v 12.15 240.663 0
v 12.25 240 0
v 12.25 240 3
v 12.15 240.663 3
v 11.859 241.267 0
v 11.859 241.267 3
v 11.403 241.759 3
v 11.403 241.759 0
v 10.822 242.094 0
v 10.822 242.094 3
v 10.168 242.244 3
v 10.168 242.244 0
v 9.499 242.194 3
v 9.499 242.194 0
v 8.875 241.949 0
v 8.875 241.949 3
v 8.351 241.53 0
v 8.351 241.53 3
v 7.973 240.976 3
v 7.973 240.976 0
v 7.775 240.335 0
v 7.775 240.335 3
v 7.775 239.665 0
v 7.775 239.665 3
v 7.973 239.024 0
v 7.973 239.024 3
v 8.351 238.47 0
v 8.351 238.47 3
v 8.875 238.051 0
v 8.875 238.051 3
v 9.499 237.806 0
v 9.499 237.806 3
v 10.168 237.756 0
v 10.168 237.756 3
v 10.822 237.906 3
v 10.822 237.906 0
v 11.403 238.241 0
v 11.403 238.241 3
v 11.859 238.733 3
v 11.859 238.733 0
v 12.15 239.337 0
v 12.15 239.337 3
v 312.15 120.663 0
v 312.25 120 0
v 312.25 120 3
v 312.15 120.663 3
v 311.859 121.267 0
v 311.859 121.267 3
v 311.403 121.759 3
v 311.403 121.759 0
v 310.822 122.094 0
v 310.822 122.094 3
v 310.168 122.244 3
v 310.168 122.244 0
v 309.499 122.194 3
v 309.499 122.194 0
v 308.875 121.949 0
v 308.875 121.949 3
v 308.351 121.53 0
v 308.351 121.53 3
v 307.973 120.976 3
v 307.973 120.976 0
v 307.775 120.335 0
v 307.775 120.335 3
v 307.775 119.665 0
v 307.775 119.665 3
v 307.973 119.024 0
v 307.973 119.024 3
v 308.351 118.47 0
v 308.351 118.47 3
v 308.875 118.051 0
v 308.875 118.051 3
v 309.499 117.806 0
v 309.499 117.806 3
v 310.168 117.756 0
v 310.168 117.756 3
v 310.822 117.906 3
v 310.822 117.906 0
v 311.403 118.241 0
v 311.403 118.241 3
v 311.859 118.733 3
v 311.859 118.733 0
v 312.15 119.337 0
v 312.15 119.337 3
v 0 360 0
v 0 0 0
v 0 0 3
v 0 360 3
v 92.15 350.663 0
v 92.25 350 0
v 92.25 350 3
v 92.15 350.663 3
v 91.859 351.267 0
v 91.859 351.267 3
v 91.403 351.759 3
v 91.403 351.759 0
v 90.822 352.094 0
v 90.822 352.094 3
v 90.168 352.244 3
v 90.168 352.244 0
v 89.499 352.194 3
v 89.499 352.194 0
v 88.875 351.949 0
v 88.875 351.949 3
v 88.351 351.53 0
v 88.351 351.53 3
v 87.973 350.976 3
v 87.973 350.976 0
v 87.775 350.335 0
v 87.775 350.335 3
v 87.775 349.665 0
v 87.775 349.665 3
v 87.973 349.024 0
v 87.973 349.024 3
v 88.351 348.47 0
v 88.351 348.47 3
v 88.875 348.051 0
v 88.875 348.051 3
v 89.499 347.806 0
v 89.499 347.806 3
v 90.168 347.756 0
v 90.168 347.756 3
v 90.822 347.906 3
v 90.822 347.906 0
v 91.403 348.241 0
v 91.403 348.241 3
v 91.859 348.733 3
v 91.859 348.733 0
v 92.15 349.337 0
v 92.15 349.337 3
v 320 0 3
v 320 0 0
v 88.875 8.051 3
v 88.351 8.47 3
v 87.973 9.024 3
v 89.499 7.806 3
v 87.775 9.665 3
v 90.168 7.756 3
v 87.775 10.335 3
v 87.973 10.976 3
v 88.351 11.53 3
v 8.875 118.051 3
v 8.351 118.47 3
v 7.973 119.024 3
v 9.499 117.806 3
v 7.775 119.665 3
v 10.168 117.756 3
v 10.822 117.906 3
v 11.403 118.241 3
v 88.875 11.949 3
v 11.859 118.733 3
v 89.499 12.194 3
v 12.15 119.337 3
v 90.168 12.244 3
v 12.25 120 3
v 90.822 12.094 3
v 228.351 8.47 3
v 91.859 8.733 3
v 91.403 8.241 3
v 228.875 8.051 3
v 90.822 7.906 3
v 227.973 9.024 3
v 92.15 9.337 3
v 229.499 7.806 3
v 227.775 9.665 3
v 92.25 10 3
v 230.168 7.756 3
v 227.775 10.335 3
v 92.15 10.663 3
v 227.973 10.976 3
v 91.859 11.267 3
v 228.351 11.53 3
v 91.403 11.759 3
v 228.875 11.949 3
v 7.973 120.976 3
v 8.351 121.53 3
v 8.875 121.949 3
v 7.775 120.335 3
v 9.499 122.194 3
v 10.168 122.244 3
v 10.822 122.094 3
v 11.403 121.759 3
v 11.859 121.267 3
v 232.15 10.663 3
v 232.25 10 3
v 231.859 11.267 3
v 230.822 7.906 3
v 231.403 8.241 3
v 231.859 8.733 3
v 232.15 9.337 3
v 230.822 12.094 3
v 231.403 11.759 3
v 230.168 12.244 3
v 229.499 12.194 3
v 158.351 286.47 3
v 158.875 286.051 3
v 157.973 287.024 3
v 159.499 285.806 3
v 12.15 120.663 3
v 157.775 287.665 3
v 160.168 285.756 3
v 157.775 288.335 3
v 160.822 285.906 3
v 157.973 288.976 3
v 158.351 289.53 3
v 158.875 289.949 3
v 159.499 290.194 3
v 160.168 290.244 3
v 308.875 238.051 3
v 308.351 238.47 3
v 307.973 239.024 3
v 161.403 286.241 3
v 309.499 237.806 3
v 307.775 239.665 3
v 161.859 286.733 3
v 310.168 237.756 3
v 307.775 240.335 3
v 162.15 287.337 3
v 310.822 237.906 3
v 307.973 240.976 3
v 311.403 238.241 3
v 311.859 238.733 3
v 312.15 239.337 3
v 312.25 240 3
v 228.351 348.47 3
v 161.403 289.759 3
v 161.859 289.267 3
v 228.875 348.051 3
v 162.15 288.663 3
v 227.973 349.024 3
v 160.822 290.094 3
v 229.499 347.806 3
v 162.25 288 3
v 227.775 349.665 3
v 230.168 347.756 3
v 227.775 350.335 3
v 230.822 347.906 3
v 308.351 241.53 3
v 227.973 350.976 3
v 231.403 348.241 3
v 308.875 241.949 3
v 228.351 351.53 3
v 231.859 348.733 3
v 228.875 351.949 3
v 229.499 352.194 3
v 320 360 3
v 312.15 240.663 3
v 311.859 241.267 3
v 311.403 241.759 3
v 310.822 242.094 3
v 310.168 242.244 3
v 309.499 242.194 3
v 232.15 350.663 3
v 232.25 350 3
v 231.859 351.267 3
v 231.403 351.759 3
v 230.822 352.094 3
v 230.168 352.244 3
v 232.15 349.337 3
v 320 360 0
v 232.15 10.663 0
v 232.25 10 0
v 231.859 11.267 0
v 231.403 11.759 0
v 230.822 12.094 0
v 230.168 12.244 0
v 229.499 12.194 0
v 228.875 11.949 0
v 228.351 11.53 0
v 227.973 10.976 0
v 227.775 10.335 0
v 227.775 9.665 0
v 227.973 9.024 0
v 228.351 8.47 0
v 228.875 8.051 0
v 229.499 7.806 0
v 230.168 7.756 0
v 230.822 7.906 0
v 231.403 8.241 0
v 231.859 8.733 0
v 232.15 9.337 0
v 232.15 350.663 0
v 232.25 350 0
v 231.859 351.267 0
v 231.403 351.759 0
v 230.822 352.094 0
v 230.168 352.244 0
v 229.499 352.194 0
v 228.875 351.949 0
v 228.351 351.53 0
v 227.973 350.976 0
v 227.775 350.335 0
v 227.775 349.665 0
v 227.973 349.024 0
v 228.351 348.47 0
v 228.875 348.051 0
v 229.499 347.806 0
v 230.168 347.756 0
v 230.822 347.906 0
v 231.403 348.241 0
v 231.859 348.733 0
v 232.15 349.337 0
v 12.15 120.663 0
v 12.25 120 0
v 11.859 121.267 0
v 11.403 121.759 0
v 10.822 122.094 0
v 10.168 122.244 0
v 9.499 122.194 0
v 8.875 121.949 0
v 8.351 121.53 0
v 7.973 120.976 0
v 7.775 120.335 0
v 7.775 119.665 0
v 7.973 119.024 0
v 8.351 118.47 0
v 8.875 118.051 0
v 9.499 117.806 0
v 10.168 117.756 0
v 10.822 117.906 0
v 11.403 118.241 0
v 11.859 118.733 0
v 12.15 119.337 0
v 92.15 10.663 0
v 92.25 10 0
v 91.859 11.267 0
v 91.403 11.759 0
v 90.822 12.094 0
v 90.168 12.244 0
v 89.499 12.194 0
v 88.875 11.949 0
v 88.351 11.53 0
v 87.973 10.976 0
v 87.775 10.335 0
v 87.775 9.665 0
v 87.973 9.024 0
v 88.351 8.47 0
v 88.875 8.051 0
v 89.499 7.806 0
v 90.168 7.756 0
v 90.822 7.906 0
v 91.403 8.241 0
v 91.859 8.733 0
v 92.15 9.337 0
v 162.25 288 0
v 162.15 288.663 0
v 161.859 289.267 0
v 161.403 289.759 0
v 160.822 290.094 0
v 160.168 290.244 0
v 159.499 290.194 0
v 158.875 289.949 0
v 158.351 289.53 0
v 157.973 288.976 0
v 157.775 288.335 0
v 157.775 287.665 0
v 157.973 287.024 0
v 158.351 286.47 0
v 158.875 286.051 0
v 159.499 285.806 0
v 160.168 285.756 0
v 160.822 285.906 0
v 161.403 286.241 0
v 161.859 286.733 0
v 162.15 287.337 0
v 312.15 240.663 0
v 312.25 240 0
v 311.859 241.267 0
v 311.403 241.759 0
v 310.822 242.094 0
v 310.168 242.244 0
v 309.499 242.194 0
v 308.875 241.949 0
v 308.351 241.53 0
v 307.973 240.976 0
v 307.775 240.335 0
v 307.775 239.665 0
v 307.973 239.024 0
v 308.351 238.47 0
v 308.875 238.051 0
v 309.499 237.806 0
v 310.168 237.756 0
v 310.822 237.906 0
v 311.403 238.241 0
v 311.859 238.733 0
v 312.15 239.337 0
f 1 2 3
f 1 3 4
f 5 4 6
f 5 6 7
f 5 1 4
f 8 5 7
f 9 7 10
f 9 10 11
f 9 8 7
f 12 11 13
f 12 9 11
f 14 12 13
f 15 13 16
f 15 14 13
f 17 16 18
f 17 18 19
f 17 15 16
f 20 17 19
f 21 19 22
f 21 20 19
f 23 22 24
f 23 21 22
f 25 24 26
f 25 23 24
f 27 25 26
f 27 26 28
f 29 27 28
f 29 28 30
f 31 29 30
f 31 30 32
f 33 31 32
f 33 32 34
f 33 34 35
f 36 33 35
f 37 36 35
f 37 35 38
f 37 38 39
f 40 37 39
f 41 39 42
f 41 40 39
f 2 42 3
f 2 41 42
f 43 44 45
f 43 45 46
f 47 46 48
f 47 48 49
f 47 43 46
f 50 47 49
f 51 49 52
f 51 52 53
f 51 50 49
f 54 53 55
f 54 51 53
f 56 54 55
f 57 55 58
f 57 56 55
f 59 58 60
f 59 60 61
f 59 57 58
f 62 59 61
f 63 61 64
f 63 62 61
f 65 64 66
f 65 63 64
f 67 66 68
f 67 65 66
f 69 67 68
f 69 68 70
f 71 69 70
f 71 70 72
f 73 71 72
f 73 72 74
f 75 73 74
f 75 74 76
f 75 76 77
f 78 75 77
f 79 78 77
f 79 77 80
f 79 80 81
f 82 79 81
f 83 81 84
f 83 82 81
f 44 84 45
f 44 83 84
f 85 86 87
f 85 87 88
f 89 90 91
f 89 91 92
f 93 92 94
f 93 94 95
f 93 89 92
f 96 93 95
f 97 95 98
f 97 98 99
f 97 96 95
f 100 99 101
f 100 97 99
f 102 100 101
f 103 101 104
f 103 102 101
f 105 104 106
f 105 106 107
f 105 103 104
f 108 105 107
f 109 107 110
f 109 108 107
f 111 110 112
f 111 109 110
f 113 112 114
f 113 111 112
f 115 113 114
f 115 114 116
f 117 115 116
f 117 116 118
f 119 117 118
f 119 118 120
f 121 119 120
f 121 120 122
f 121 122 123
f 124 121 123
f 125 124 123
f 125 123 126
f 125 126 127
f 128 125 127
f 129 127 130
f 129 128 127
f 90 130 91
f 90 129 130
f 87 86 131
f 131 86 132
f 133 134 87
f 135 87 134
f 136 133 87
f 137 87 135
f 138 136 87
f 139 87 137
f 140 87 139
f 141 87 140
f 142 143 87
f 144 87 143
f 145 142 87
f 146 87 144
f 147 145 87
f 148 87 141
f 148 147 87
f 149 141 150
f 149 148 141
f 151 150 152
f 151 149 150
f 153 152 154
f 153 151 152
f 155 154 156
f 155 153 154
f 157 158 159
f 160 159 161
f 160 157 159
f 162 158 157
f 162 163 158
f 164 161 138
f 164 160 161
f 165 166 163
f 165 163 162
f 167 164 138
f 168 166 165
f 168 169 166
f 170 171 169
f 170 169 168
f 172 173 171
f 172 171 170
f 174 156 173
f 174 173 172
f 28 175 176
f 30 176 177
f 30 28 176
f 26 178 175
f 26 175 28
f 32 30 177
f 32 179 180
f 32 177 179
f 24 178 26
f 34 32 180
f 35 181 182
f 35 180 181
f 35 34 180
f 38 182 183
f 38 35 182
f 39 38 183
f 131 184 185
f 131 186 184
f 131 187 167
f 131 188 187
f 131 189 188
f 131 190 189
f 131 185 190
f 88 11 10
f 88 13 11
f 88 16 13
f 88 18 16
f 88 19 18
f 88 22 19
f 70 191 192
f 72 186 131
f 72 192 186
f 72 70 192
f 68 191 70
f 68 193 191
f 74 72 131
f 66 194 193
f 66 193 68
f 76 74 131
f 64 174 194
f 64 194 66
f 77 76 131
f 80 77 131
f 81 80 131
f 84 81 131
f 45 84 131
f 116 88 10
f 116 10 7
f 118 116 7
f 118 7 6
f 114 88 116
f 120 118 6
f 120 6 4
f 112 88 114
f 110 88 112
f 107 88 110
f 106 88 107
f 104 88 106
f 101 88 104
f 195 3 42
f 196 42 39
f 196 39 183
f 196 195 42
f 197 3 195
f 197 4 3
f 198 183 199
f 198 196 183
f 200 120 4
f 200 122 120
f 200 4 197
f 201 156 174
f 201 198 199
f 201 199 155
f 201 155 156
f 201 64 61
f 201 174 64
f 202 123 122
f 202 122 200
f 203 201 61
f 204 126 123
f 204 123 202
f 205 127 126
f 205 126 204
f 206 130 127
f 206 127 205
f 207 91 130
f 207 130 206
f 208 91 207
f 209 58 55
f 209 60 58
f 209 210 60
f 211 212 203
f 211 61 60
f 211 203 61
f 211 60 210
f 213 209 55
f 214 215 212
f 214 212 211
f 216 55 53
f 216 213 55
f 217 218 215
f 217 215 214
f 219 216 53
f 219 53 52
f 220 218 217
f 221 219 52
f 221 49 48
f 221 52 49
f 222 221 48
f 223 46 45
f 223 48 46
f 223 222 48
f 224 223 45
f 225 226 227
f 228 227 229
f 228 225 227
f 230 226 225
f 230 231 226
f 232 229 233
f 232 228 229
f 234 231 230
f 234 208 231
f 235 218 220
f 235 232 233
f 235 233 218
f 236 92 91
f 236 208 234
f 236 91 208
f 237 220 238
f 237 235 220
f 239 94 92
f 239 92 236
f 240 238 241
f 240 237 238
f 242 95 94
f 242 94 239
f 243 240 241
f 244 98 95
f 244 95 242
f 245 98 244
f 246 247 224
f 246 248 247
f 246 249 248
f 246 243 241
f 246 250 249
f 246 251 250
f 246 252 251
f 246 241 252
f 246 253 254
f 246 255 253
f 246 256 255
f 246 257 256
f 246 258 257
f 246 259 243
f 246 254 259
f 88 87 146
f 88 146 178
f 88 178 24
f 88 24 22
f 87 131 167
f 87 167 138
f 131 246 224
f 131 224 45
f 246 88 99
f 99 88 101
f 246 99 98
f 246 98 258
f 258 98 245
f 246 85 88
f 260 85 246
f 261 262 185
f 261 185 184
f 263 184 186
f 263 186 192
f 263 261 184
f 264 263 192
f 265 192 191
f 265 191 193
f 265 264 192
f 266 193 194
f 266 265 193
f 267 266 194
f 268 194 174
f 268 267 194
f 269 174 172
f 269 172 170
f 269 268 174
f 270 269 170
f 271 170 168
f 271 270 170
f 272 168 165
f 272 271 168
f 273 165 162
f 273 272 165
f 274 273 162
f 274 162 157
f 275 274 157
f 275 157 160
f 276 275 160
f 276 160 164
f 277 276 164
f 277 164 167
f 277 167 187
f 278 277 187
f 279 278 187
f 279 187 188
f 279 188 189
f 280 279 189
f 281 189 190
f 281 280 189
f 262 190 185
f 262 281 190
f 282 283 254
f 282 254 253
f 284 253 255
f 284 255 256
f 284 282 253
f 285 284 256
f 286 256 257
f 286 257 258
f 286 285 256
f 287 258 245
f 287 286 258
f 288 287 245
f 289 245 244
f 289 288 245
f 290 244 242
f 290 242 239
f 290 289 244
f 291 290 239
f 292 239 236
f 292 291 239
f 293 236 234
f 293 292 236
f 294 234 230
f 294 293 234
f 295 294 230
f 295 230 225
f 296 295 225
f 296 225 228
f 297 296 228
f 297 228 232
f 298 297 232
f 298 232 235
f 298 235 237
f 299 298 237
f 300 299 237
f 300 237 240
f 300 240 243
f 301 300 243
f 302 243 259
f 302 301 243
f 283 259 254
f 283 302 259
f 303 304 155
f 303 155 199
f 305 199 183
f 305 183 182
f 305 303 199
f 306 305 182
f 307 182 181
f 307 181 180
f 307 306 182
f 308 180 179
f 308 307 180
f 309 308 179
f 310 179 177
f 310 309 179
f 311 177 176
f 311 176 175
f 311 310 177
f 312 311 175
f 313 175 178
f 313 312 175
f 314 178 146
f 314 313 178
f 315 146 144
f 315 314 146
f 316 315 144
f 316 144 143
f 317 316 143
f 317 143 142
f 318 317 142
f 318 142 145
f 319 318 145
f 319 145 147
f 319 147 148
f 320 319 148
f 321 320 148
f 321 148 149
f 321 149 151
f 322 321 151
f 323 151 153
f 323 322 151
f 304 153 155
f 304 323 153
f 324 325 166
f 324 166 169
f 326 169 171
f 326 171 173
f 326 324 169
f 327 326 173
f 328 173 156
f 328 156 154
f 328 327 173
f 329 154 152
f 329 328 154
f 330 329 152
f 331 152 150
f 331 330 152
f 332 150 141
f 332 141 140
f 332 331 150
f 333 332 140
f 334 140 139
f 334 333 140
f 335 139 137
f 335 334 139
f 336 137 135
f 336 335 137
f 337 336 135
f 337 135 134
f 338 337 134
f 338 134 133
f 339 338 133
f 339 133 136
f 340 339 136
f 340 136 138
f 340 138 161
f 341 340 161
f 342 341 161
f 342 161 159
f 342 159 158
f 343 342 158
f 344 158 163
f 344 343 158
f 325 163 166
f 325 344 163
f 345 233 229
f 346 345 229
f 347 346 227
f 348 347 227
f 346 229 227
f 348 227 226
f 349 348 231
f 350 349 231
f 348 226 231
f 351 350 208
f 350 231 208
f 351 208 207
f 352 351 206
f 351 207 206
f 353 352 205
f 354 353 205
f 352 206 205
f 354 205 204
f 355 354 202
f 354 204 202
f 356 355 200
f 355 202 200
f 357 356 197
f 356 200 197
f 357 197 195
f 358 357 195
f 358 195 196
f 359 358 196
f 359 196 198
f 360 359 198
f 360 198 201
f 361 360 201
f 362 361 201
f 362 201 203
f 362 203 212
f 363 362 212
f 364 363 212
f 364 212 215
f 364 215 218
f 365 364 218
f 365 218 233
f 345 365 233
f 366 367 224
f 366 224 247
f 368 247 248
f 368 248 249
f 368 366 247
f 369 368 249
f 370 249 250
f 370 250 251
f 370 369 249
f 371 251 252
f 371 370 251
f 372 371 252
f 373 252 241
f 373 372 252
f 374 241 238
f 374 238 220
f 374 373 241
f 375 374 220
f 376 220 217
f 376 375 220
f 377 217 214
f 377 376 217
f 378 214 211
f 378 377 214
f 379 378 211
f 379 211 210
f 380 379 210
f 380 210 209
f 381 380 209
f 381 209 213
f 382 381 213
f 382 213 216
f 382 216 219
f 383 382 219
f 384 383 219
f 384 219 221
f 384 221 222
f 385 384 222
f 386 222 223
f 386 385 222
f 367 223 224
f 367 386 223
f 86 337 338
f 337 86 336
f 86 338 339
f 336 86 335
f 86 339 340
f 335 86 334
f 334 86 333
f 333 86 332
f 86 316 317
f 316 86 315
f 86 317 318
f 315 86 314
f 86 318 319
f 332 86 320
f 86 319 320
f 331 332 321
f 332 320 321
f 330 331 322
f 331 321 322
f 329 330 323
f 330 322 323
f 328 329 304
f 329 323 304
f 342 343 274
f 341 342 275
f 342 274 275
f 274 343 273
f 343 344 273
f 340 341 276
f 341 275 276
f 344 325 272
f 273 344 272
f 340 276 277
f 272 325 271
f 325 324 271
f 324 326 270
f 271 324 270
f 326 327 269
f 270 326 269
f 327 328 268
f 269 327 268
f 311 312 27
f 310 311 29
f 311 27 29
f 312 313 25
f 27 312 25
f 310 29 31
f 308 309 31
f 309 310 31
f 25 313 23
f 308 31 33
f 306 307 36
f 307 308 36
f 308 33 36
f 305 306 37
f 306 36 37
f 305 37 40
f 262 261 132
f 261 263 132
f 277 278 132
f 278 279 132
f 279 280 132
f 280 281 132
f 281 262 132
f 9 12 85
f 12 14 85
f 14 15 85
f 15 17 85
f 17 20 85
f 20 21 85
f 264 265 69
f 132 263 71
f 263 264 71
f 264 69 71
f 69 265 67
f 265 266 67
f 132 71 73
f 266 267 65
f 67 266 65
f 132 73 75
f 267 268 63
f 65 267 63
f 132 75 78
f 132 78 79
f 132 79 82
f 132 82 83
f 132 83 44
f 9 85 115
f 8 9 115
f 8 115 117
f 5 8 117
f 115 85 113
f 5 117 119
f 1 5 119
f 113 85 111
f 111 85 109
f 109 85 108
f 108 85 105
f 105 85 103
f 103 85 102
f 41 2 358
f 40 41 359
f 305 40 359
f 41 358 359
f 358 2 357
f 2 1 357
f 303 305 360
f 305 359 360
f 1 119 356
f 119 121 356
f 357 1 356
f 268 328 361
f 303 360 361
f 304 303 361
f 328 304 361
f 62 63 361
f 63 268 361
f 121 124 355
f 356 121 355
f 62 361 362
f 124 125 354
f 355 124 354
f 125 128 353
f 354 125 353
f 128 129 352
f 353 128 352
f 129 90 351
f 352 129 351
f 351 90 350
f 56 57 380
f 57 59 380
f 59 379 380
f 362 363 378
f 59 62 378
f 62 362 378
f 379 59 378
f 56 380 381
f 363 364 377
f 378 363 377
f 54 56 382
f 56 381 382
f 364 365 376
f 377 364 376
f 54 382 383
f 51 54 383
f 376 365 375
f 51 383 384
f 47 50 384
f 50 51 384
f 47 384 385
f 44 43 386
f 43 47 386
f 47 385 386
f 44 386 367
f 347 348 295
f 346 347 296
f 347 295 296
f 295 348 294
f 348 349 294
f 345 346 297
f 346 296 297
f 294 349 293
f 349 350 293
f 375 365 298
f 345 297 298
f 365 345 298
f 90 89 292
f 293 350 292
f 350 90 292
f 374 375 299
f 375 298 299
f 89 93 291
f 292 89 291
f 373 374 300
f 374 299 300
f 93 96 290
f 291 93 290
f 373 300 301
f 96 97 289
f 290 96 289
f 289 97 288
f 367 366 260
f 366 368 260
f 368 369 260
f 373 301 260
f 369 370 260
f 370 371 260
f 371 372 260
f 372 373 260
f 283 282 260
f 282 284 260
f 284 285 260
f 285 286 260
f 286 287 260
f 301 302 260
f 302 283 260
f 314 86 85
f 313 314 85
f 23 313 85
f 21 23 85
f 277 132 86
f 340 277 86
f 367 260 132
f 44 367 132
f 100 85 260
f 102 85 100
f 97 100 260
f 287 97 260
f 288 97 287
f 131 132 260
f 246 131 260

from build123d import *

# Parameters (mm, degrees)
SKETCH_1_W          = 320
SKETCH_1_H          = 360
SKETCH_1_R          = 2.25
EXTRUDE_1_DEPTH     = 3
SKETCH_2_R          = 2.25
CUT_EXTRUDE_1_DEPTH = 4


with BuildPart() as part:
    # Эскиз1 → Бобышка-Вытянуть1 (new body)
    with BuildSketch(Plane.XY):
        with Locations((160, 180)):
            Rectangle(SKETCH_1_W, SKETCH_1_H)
        with Locations((90, 350)):
            Circle(SKETCH_1_R, mode=Mode.SUBTRACT)
        with Locations((230, 350)):
            Circle(SKETCH_1_R, mode=Mode.SUBTRACT)
        with Locations((10, 240)):
            Circle(SKETCH_1_R, mode=Mode.SUBTRACT)
        with Locations((10, 120)):
            Circle(SKETCH_1_R, mode=Mode.SUBTRACT)
        with Locations((310, 240)):
            Circle(SKETCH_1_R, mode=Mode.SUBTRACT)
        with Locations((310, 120)):
            Circle(SKETCH_1_R, mode=Mode.SUBTRACT)
        with Locations((90, 10)):
            Circle(SKETCH_1_R, mode=Mode.SUBTRACT)
        with Locations((230, 10)):
            Circle(SKETCH_1_R, mode=Mode.SUBTRACT)
    extrude(amount=EXTRUDE_1_DEPTH)

    # Эскиз2 → Вырез-Вытянуть1 (cut, through all)
    with BuildSketch(Plane.XY.offset(3)):
        with Locations((160, 288)):
            Circle(SKETCH_2_R)
    extrude(amount=-CUT_EXTRUDE_1_DEPTH, mode=Mode.SUBTRACT)


solid = part.part
